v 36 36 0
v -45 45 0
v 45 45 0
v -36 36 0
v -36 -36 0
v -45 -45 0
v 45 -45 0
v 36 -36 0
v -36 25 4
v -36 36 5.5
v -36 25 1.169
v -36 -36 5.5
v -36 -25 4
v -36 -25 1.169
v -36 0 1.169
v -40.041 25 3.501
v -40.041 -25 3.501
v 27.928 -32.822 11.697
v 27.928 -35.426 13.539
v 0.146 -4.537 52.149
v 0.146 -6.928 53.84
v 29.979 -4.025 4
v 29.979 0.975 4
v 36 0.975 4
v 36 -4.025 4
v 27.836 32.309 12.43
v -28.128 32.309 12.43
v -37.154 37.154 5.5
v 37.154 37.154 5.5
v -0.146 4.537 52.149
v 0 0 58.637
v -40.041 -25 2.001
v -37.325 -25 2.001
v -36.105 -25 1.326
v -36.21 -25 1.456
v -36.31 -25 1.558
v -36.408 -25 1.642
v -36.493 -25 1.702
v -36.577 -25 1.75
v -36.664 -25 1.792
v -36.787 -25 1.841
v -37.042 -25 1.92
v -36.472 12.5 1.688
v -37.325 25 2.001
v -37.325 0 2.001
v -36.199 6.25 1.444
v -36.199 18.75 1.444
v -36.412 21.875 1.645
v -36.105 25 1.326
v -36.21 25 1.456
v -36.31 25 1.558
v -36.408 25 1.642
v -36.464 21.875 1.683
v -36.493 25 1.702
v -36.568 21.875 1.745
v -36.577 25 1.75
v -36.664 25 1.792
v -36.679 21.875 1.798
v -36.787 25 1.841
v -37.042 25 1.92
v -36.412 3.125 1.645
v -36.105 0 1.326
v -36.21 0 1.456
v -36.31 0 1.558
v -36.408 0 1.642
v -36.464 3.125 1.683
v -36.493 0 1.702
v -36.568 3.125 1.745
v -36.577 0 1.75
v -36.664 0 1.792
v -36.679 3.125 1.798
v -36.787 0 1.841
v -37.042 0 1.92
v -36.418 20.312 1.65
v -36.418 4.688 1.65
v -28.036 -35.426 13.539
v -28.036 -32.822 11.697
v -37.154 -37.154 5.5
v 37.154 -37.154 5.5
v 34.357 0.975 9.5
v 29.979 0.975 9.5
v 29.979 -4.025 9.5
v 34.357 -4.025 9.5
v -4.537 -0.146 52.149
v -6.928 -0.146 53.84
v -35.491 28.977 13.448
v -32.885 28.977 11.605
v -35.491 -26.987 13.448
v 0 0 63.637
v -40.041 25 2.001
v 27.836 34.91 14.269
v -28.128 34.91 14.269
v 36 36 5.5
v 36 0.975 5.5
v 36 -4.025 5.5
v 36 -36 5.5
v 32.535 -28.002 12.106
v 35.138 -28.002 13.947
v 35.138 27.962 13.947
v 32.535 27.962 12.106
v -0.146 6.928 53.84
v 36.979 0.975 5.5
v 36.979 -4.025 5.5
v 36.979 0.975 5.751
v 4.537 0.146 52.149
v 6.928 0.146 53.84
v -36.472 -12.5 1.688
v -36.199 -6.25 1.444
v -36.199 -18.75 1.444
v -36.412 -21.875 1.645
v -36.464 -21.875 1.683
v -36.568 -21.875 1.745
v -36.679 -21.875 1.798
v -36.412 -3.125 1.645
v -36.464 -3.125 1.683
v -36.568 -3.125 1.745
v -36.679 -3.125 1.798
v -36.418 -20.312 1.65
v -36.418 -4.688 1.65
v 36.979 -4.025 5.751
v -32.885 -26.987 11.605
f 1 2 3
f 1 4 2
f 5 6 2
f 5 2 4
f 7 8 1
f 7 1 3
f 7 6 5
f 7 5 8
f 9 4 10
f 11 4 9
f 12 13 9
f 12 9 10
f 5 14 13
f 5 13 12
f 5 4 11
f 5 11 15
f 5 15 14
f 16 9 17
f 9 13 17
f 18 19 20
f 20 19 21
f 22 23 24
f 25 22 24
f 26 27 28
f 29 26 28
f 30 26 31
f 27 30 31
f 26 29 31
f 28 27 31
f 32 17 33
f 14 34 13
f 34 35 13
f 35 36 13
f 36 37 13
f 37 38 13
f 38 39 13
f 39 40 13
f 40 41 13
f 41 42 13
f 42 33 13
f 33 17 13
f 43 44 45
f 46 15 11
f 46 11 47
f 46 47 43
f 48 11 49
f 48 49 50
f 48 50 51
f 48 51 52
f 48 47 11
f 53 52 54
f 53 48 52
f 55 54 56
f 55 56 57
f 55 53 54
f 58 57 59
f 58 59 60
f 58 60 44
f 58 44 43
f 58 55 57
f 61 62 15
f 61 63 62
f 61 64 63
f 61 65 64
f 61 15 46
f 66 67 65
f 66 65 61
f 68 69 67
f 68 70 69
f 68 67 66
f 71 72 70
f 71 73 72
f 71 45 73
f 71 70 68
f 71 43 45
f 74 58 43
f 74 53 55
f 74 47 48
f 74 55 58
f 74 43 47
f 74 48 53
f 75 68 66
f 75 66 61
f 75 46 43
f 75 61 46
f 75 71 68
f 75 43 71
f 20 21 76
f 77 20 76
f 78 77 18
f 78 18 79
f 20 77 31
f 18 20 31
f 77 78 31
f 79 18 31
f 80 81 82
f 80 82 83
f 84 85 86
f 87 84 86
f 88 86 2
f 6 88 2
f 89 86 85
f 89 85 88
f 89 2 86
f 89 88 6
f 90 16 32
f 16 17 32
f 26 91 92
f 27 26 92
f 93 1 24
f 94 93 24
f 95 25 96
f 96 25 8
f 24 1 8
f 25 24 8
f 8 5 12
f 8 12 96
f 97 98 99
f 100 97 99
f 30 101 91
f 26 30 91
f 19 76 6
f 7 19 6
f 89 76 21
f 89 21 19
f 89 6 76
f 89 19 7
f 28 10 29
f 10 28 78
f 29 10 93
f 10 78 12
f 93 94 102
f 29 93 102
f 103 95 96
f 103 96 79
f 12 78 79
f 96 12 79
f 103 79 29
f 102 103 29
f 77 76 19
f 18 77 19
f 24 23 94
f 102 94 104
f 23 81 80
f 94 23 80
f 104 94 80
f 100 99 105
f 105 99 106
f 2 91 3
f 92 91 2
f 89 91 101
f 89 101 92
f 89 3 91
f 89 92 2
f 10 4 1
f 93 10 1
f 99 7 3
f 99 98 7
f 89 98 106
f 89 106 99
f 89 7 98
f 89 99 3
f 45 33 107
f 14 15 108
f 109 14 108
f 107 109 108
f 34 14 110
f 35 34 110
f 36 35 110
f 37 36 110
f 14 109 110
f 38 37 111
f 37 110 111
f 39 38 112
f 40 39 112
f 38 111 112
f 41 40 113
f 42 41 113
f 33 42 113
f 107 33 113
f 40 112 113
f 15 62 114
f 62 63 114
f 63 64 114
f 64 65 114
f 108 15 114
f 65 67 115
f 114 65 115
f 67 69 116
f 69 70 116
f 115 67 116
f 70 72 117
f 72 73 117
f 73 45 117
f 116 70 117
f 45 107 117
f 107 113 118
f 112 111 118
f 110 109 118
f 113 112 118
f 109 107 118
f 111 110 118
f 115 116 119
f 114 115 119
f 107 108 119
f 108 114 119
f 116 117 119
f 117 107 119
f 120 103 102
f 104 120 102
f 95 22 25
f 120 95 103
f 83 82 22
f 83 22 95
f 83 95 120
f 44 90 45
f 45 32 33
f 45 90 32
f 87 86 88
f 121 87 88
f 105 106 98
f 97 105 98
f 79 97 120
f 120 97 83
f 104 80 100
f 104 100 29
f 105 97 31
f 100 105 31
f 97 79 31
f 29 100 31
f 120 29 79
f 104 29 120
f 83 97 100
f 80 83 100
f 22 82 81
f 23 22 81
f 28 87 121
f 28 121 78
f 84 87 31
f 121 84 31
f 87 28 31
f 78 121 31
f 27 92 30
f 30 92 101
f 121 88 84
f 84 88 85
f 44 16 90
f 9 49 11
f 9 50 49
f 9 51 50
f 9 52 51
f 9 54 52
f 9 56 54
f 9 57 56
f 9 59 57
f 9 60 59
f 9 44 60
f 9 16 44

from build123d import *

# Parameters (mm, degrees)
F2_W           = 90
F2_H           = 90
F6_W           = 82
F6_H           = 82
F12_DEPTH      = 5
F13_DEPTH      = 10.1
F14_DEPTH      = 10
F15_DEPTH      = 10
F17_W          = 82
F17_H          = 82
F17_W_2        = 72
F17_H_2        = 72
F18_DEPTH      = 5.5
F20_DEPTH      = 25
F20_DEPTH_BACK = 25
F21_W          = 7
F21_H          = 5
F22_DEPTH      = 4
F22_DEPTH_BACK = 1.5


with BuildPart() as f3:
    # F2 (on Top) → F3 section 0
    with BuildSketch(Plane.XY, mode=Mode.PRIVATE) as f3_s0:
        Rectangle(F2_W, F2_H)
    loft([f3_s0.sketch, Vertex(0, 0, 63.6368)])

    # F6 (on face) → F7 section 0
    with BuildSketch(Plane.XY, mode=Mode.PRIVATE) as f7_s0:
        Rectangle(F6_W, F6_H)
    loft([f7_s0.sketch, Vertex(0, 0, 58.6368)], mode=Mode.SUBTRACT)

    # F8 (on face) → F12 (cut, symmetric)
    with BuildSketch(Plane(origin=(29.9991167733, 0, 21.2135156827), x_dir=(0, 1, 0), z_dir=(0.8164845616, 0, 0.5773672666))):
        Polygon((0.1463476627, 39.9593571873), (-28.0024763197, -8.9000007138), (27.9615262598, -8.9000007138), align=None)
    extrude(amount=F12_DEPTH, both=True, mode=Mode.SUBTRACT)

    # F9 (on face) → F13 (cut)
    with BuildSketch(Plane(origin=(0, 29.9991167733, 21.2135156827), x_dir=(-1, 0, 0), z_dir=(0, 0.8164845616, 0.5773672666))):
        Polygon((0.1463476627, 39.9593571873), (-27.835653627, -8.5054690465), (28.1283489525, -8.5054690465), align=None)
    extrude(amount=-F13_DEPTH, mode=Mode.SUBTRACT)

    # F10 (on face) → F14 (cut)
    with BuildSketch(Plane(origin=(-29.9991167733, 0, 21.2135156827), x_dir=(0, -1, 0), z_dir=(-0.8164845616, 0, 0.5773672666))):
        Polygon((0.1463476627, 39.9593571873), (-28.9770383388, -9.5114903525), (26.9869642407, -9.5114903525), align=None)
    extrude(amount=-F14_DEPTH, mode=Mode.SUBTRACT)

    # F11 (on face) → F15 (cut)
    with BuildSketch(Plane(origin=(0, -29.9991167733, 21.2135156827), x_dir=(1, 0, 0), z_dir=(0, -0.8164845616, 0.5773672666))):
        Polygon((0.1463476627, 39.9593571873), (-28.0361250043, -9.3999961391), (27.9278775752, -9.3999961391), align=None)
    extrude(amount=-F15_DEPTH, mode=Mode.SUBTRACT)

    # F17 (on face) → F18 (join)
    with BuildSketch(Plane(origin=(0, 0, 0), x_dir=(1, 0, 0), z_dir=(0, 0, -1))):
        Rectangle(F17_W, F17_H)
        Rectangle(F17_W_2, F17_H_2, mode=Mode.SUBTRACT)
    extrude(amount=-F18_DEPTH)

    # F19 (on Front) → F20 (cut, two sides)
    with BuildSketch(Plane.XZ) as f20_sk:
        Polygon((-40.0405423343, 3.5011546063), (-40.0405423343, 2.0011546063), (-37.3253502548, 2.0011546063), (-36, 2.0011546063), (-36, 4.0000034512), align=None)
        with BuildLine():
            Line((-36, 2.0011546063), (-37.3253502548, 2.0011546063))
            add(Edge.make_bspline(
                [(-36, 1.16889), (-36.1044551713, 1.344294706), (-36.4561719625, 1.7902625565), (-36.9847986044, 1.9009668548), (-37.3253502548, 2.0011546063)],
                knots=[0, 0, 0, 0, 0.4677482512, 1, 1, 1, 1], degree=3))
            Line((-36, 1.16889), (-36, 2.0011546063))
        make_face()
    extrude(amount=-F20_DEPTH, mode=Mode.SUBTRACT)
    extrude(f20_sk.sketch, amount=F20_DEPTH_BACK, mode=Mode.SUBTRACT)

    # F21 (on face) → F22 (join, two sides)
    with BuildSketch(Plane.XY.offset(5.5)) as f22_sk:
        with Locations((33.4785108268, -1.5248925798)):
            Rectangle(F21_W, F21_H)
    extrude(amount=F22_DEPTH)
    extrude(f22_sk.sketch, amount=-F22_DEPTH_BACK)


solid = f3.part
